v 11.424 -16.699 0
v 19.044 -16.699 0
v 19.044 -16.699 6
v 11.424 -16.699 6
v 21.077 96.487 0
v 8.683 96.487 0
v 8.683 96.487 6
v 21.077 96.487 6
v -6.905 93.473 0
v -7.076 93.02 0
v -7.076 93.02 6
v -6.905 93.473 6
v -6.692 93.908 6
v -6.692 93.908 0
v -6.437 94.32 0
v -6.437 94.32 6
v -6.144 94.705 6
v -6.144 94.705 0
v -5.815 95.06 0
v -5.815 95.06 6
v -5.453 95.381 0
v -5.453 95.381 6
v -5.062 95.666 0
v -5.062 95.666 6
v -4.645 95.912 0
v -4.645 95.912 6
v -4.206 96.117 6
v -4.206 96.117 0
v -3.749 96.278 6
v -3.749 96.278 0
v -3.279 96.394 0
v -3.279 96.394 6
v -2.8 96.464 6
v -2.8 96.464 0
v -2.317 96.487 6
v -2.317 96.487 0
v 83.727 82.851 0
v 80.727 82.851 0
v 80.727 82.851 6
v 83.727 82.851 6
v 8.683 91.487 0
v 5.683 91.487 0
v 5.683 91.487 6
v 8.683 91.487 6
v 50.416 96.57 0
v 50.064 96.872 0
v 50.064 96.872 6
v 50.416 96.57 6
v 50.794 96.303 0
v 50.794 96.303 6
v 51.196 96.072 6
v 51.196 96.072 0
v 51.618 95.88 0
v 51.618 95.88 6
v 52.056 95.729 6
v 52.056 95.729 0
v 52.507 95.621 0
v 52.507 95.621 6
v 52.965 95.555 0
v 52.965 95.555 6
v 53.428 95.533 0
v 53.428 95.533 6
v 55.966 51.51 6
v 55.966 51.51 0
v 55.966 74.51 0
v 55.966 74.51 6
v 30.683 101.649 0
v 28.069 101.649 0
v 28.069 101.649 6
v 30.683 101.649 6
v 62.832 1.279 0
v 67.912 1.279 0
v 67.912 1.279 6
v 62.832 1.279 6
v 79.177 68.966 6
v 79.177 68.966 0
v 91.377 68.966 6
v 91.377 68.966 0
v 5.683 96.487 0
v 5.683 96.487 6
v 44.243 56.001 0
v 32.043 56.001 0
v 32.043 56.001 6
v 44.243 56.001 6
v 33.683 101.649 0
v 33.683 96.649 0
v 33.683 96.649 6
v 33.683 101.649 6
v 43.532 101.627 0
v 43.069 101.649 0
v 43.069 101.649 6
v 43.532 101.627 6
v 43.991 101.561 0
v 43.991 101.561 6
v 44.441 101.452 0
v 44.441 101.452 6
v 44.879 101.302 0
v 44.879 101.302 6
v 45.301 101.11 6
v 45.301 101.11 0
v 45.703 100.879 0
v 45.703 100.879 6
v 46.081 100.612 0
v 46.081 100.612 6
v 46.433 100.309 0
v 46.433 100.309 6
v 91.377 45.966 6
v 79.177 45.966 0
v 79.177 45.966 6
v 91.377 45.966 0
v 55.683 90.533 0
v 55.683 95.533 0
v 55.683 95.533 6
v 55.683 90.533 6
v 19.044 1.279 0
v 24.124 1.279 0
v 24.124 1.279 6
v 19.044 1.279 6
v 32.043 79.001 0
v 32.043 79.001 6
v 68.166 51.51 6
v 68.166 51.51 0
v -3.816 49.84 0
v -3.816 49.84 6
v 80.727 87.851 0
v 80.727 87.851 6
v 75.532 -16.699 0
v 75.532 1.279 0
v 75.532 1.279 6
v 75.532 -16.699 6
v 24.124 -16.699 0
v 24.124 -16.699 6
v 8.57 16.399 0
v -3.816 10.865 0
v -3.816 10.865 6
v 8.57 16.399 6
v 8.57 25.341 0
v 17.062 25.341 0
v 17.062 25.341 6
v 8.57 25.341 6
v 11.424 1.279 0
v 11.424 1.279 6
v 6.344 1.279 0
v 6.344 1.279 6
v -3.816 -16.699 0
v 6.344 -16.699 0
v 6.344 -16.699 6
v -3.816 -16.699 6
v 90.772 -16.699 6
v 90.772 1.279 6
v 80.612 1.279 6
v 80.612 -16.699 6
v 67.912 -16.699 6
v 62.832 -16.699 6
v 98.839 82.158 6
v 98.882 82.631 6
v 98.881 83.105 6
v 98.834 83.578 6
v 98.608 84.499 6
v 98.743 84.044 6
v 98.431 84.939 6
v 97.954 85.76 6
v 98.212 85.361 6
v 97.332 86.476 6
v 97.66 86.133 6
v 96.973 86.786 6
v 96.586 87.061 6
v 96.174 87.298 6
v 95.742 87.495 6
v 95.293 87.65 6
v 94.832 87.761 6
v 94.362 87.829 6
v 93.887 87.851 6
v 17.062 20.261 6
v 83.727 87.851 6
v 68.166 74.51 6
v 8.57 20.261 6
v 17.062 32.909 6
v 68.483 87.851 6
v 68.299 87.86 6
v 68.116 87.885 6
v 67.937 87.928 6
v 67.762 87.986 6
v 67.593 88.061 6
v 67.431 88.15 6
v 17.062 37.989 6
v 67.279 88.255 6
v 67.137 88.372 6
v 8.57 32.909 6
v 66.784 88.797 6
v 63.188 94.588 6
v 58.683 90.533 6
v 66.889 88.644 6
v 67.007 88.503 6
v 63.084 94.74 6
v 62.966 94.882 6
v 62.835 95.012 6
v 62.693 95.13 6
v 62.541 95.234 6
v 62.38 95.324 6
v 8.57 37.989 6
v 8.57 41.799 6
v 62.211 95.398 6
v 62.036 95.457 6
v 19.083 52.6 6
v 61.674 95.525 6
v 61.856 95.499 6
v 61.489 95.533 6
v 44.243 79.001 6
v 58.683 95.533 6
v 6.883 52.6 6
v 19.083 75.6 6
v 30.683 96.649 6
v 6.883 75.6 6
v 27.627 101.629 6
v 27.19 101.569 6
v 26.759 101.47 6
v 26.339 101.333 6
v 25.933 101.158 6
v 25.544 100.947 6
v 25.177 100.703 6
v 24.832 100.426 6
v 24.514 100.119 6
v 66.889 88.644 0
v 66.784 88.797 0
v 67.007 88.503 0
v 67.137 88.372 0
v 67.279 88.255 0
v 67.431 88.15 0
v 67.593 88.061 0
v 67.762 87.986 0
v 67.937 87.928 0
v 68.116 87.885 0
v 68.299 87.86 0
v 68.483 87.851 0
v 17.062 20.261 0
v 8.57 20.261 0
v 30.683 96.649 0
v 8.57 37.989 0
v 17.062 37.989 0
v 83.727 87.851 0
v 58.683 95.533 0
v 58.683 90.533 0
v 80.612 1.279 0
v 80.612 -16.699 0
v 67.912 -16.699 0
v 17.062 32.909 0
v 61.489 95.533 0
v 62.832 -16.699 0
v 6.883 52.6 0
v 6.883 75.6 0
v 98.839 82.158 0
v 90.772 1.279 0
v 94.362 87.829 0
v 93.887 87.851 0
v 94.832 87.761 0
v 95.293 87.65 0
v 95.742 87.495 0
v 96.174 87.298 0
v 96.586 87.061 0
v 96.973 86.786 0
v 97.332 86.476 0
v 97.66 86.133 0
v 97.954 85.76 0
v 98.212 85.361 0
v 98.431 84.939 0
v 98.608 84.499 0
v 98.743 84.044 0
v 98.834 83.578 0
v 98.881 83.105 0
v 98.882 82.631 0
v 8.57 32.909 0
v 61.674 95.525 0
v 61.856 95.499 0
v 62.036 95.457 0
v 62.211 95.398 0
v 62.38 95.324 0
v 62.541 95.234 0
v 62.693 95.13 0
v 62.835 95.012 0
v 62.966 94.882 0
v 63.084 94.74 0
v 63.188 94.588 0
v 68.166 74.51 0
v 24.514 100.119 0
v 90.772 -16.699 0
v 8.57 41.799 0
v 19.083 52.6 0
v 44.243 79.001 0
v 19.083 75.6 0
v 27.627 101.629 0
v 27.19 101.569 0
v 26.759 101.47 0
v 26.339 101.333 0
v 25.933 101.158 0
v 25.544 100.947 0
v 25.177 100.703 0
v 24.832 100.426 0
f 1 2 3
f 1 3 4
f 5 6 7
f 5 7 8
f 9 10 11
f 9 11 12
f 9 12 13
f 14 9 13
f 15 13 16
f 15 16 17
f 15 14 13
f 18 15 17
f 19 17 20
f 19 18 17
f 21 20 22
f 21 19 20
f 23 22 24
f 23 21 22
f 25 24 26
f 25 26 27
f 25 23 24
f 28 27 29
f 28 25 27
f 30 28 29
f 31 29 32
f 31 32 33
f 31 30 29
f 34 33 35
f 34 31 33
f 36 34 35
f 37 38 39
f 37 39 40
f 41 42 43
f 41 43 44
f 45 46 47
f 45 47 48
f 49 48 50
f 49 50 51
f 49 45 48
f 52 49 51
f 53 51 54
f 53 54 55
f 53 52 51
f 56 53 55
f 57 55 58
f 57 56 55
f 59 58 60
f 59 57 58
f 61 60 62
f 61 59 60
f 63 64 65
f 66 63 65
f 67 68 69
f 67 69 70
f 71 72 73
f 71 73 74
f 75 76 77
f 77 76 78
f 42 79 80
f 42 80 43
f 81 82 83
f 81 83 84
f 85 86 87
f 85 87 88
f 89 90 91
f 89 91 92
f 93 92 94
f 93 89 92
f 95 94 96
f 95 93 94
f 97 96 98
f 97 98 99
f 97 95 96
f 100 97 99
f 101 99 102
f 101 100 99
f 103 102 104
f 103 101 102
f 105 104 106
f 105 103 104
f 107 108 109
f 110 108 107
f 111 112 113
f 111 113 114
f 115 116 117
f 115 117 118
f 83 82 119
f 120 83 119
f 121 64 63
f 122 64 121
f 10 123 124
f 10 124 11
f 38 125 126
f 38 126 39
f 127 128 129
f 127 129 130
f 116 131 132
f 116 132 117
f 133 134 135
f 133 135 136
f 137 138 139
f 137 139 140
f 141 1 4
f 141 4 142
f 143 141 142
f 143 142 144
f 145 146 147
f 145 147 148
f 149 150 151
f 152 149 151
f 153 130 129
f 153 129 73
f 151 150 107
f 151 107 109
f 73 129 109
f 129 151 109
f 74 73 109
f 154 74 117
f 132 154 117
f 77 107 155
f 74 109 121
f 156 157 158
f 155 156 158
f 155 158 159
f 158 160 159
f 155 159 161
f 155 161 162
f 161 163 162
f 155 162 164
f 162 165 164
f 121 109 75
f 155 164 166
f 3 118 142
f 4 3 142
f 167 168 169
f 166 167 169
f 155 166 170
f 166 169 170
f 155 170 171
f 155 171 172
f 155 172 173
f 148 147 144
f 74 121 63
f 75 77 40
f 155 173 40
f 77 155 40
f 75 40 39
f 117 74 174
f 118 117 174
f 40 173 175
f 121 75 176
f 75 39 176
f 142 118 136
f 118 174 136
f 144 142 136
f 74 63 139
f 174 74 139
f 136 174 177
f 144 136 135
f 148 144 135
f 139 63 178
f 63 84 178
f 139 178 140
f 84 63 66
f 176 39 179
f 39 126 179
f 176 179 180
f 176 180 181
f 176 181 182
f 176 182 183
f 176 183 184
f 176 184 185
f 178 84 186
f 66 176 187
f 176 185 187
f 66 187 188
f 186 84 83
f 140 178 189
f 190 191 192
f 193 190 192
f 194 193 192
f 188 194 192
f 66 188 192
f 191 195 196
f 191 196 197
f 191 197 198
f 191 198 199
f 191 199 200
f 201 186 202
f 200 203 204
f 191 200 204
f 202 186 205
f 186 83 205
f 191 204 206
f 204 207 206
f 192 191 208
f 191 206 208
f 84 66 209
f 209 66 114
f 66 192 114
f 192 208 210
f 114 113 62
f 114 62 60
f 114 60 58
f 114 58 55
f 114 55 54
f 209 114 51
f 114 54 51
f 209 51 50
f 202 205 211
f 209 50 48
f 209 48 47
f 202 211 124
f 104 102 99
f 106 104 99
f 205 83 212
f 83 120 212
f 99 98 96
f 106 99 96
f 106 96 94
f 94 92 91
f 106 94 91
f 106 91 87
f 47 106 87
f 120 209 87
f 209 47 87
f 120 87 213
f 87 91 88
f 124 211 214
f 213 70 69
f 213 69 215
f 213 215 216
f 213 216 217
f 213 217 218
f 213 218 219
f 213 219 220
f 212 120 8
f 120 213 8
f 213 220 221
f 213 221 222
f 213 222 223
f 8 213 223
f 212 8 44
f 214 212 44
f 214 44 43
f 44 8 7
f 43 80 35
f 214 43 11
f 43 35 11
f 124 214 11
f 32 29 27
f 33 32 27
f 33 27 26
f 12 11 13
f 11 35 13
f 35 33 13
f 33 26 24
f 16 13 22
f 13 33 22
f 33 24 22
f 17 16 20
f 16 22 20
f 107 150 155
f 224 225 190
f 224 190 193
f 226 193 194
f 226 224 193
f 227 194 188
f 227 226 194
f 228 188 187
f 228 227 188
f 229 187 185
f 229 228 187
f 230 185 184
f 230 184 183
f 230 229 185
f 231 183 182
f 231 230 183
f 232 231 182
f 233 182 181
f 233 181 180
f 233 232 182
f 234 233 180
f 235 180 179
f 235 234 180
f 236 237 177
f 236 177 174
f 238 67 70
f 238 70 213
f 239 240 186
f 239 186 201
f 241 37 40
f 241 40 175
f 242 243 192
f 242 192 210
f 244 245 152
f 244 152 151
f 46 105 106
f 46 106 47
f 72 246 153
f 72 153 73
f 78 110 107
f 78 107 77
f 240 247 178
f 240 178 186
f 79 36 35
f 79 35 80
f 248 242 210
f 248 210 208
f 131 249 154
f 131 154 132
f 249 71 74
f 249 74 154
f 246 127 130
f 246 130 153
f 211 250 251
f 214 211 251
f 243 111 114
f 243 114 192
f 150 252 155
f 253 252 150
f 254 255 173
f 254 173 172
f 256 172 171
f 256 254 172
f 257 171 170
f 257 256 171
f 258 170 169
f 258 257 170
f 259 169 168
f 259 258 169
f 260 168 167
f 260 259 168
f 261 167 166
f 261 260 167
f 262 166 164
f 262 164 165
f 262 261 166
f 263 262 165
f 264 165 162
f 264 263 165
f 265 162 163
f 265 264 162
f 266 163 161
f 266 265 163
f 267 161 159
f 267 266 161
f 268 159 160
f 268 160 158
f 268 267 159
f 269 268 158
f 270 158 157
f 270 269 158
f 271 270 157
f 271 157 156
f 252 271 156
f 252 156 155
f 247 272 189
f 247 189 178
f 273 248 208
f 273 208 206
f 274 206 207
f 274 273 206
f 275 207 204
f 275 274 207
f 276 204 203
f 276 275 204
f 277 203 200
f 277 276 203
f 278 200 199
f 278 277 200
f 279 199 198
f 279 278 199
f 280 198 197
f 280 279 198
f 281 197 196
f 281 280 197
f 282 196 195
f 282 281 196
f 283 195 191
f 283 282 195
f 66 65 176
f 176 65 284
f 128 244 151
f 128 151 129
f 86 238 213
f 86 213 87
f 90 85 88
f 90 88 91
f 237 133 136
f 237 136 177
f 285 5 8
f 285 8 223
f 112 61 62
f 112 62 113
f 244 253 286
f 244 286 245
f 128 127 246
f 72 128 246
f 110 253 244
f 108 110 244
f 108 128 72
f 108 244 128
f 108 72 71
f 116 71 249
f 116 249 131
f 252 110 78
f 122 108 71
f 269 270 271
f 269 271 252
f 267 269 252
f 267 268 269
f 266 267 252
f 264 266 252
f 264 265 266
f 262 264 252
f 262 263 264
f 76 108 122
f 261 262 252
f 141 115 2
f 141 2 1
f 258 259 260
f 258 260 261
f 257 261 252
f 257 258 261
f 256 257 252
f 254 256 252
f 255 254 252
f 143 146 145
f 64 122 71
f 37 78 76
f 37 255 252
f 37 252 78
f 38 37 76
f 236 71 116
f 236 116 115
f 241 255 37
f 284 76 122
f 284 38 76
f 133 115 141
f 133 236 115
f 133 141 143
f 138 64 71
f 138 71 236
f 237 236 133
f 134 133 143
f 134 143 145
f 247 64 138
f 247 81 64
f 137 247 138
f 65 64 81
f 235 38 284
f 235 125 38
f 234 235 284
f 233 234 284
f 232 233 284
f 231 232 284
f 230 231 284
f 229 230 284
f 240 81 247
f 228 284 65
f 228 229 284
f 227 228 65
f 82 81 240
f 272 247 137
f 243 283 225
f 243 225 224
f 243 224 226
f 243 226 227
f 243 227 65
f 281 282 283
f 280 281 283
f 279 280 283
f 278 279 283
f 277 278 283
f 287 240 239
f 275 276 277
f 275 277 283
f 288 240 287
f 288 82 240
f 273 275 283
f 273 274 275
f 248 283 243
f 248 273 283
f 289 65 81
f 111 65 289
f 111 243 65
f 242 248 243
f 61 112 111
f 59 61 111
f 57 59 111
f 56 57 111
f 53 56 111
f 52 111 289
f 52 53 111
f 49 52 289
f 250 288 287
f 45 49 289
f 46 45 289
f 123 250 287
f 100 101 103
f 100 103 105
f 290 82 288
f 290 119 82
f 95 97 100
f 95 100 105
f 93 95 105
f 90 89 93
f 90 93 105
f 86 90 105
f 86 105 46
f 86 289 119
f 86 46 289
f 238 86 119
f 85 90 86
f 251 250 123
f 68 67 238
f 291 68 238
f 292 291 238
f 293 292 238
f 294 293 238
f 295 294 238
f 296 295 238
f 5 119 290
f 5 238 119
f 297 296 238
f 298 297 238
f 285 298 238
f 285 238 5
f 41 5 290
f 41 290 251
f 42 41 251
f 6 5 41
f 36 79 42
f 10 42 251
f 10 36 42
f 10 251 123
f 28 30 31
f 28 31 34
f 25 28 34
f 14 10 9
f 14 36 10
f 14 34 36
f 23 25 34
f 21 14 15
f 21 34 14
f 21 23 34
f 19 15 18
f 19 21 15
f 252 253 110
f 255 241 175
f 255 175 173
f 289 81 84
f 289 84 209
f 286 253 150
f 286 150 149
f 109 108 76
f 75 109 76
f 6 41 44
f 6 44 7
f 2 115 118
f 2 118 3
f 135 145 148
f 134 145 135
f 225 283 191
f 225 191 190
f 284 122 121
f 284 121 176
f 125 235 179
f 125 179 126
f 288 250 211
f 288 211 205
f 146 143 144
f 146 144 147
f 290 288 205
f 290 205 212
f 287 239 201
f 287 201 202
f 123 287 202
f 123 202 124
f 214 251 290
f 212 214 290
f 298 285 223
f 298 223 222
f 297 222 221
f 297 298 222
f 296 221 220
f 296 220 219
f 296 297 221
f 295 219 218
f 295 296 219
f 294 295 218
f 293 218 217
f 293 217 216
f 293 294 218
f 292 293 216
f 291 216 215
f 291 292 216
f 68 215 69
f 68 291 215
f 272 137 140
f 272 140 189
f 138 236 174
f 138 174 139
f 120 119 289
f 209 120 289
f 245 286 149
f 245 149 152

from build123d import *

# Parameters (mm, degrees)
SKETCH1_W           = 12.2
SKETCH1_H           = 23
BOSS_EXTRUDE1_DEPTH = 6


with BuildPart() as part:
    # Sketch1 → Boss-Extrude1 (new body)
    with BuildSketch(Plane.XY):
        with BuildLine():
            Line((21.077436259, 96.487236066), (24.514288944, 100.118770675))
            ThreePointArc((24.514288944, 100.118770675), (26.133905044, 101.250028723), (28.068821983, 101.648773655))
            Line((28.068821983, 101.648773655), (30.683177697, 101.648773655))
            Line((30.683177697, 101.648773655), (30.683177697, 96.648773655))
            Line((30.683177697, 96.648773655), (33.683177697, 96.648773655))
            Line((33.683177697, 96.648773655), (33.683177697, 101.648773655))
            Line((33.683177697, 101.648773655), (43.068821983, 101.648773655))
            ThreePointArc((43.068821983, 101.648773655), (44.879241743, 101.301597143), (46.432801053, 100.309324643))
            Line((46.432801053, 100.309324643), (50.064335662, 96.872471958))
            ThreePointArc((50.064335662, 96.872471958), (51.617894972, 95.880199458), (53.428314733, 95.533022946))
            Line((53.428314733, 95.533022946), (55.683177697, 95.533022946))
            Line((55.683177697, 95.533022946), (55.683177697, 90.533022946))
            Line((55.683177697, 90.533022946), (58.683177697, 90.533022946))
            Line((58.683177697, 90.533022946), (58.683177697, 95.533022946))
            Line((58.683177697, 95.533022946), (61.489325132, 95.533022946))
            ThreePointArc((61.489325132, 95.533022946), (62.461477954, 95.280855573), (63.188485552, 94.587941837))
            Line((63.188485552, 94.587941837), (66.784051646, 88.796554795))
            ThreePointArc((66.784051646, 88.796554795), (67.511059245, 88.10364106), (68.483212066, 87.851473686))
            Line((68.483212066, 87.851473686), (80.727367549, 87.851473686))
            Line((80.727367549, 87.851473686), (80.727367549, 82.851473686))
            Line((80.727367549, 82.851473686), (83.727367549, 82.851473686))
            Line((83.727367549, 82.851473686), (83.727367549, 87.851473686))
            Line((83.727367549, 87.851473686), (93.887367549, 87.851473686))
            ThreePointArc((93.887367549, 87.851473686), (97.660193959, 86.132598628), (98.839013483, 82.157786039))
            Line((98.839013483, 82.157786039), (90.771737035, 1.27912723))
            Line((90.771737035, 1.27912723), (90.771737035, -16.699114739))
            Line((90.771737035, -16.699114739), (80.611737035, -16.699114739))
            Line((80.611737035, -16.699114739), (80.611737035, 1.27912723))
            Line((80.611737035, 1.27912723), (75.531737035, 1.27912723))
            Line((75.531737035, 1.27912723), (75.531737035, -16.699114739))
            Line((75.531737035, -16.699114739), (67.911737035, -16.699114739))
            Line((67.911737035, -16.699114739), (67.911737035, 1.27912723))
            Line((67.911737035, 1.27912723), (62.831737035, 1.27912723))
            Line((62.831737035, 1.27912723), (62.831737035, -16.699114739))
            Line((62.831737035, -16.699114739), (24.124020717, -16.699114739))
            Line((24.124020717, -16.699114739), (24.124020717, 1.27912723))
            Line((24.124020717, 1.27912723), (19.044020717, 1.27912723))
            Line((19.044020717, 1.27912723), (19.044020717, -16.699114739))
            Line((19.044020717, -16.699114739), (11.424020717, -16.699114739))
            Line((11.424020717, -16.699114739), (11.424020717, 1.27912723))
            Line((11.424020717, 1.27912723), (6.344020717, 1.27912723))
            Line((6.344020717, 1.27912723), (6.344020717, -16.699114739))
            Line((6.344020717, -16.699114739), (-3.815979283, -16.699114739))
            Line((-3.815979283, -16.699114739), (-3.815979283, 1.27912723))
            Line((-3.815979283, 1.27912723), (-3.815979283, 10.864597722))
            Line((-3.815979283, 10.864597722), (8.569519397, 16.399351506))
            Line((8.569519397, 16.399351506), (8.569519397, 20.261157087))
            Line((8.569519397, 20.261157087), (17.062273891, 20.261157087))
            Line((17.062273891, 20.261157087), (17.062273891, 25.341157087))
            Line((17.062273891, 25.341157087), (8.569519397, 25.341157087))
            Line((8.569519397, 25.341157087), (8.569519397, 32.909351506))
            Line((8.569519397, 32.909351506), (17.062273891, 32.909351506))
            Line((17.062273891, 32.909351506), (17.062273891, 37.989351506))
            Line((17.062273891, 37.989351506), (8.569519397, 37.989351506))
            Line((8.569519397, 37.989351506), (8.569519397, 41.799351506))
            Line((8.569519397, 41.799351506), (-3.815979283, 49.840454802))
            Line((-3.815979283, 49.840454802), (-7.075944103, 93.020454802))
            ThreePointArc((-7.075944103, 93.020454802), (-5.26079125, 95.528652506), (-2.316822303, 96.487236066))
            Line((-2.316822303, 96.487236066), (5.683177697, 96.487236066))
            Line((5.683177697, 96.487236066), (5.683177697, 91.487236066))
            Line((5.683177697, 91.487236066), (8.683177697, 91.487236066))
            Line((8.683177697, 91.487236066), (8.683177697, 96.487236066))
            Line((8.683177697, 96.487236066), (21.077436259, 96.487236066))
        make_face()
        with Locations((85.276683747, 57.465671264)):
            Rectangle(SKETCH1_W, SKETCH1_H, mode=Mode.SUBTRACT)
        with Locations((62.066293543, 63.009787098)):
            Rectangle(SKETCH1_W, SKETCH1_H, mode=Mode.SUBTRACT)
        with Locations((38.142588603, 67.50121976)):
            Rectangle(SKETCH1_W, SKETCH1_H, mode=Mode.SUBTRACT)
        with Locations((12.98270306, 64.099542403)):
            Rectangle(SKETCH1_W, SKETCH1_H, mode=Mode.SUBTRACT)
    extrude(amount=BOSS_EXTRUDE1_DEPTH)


solid = part.part
